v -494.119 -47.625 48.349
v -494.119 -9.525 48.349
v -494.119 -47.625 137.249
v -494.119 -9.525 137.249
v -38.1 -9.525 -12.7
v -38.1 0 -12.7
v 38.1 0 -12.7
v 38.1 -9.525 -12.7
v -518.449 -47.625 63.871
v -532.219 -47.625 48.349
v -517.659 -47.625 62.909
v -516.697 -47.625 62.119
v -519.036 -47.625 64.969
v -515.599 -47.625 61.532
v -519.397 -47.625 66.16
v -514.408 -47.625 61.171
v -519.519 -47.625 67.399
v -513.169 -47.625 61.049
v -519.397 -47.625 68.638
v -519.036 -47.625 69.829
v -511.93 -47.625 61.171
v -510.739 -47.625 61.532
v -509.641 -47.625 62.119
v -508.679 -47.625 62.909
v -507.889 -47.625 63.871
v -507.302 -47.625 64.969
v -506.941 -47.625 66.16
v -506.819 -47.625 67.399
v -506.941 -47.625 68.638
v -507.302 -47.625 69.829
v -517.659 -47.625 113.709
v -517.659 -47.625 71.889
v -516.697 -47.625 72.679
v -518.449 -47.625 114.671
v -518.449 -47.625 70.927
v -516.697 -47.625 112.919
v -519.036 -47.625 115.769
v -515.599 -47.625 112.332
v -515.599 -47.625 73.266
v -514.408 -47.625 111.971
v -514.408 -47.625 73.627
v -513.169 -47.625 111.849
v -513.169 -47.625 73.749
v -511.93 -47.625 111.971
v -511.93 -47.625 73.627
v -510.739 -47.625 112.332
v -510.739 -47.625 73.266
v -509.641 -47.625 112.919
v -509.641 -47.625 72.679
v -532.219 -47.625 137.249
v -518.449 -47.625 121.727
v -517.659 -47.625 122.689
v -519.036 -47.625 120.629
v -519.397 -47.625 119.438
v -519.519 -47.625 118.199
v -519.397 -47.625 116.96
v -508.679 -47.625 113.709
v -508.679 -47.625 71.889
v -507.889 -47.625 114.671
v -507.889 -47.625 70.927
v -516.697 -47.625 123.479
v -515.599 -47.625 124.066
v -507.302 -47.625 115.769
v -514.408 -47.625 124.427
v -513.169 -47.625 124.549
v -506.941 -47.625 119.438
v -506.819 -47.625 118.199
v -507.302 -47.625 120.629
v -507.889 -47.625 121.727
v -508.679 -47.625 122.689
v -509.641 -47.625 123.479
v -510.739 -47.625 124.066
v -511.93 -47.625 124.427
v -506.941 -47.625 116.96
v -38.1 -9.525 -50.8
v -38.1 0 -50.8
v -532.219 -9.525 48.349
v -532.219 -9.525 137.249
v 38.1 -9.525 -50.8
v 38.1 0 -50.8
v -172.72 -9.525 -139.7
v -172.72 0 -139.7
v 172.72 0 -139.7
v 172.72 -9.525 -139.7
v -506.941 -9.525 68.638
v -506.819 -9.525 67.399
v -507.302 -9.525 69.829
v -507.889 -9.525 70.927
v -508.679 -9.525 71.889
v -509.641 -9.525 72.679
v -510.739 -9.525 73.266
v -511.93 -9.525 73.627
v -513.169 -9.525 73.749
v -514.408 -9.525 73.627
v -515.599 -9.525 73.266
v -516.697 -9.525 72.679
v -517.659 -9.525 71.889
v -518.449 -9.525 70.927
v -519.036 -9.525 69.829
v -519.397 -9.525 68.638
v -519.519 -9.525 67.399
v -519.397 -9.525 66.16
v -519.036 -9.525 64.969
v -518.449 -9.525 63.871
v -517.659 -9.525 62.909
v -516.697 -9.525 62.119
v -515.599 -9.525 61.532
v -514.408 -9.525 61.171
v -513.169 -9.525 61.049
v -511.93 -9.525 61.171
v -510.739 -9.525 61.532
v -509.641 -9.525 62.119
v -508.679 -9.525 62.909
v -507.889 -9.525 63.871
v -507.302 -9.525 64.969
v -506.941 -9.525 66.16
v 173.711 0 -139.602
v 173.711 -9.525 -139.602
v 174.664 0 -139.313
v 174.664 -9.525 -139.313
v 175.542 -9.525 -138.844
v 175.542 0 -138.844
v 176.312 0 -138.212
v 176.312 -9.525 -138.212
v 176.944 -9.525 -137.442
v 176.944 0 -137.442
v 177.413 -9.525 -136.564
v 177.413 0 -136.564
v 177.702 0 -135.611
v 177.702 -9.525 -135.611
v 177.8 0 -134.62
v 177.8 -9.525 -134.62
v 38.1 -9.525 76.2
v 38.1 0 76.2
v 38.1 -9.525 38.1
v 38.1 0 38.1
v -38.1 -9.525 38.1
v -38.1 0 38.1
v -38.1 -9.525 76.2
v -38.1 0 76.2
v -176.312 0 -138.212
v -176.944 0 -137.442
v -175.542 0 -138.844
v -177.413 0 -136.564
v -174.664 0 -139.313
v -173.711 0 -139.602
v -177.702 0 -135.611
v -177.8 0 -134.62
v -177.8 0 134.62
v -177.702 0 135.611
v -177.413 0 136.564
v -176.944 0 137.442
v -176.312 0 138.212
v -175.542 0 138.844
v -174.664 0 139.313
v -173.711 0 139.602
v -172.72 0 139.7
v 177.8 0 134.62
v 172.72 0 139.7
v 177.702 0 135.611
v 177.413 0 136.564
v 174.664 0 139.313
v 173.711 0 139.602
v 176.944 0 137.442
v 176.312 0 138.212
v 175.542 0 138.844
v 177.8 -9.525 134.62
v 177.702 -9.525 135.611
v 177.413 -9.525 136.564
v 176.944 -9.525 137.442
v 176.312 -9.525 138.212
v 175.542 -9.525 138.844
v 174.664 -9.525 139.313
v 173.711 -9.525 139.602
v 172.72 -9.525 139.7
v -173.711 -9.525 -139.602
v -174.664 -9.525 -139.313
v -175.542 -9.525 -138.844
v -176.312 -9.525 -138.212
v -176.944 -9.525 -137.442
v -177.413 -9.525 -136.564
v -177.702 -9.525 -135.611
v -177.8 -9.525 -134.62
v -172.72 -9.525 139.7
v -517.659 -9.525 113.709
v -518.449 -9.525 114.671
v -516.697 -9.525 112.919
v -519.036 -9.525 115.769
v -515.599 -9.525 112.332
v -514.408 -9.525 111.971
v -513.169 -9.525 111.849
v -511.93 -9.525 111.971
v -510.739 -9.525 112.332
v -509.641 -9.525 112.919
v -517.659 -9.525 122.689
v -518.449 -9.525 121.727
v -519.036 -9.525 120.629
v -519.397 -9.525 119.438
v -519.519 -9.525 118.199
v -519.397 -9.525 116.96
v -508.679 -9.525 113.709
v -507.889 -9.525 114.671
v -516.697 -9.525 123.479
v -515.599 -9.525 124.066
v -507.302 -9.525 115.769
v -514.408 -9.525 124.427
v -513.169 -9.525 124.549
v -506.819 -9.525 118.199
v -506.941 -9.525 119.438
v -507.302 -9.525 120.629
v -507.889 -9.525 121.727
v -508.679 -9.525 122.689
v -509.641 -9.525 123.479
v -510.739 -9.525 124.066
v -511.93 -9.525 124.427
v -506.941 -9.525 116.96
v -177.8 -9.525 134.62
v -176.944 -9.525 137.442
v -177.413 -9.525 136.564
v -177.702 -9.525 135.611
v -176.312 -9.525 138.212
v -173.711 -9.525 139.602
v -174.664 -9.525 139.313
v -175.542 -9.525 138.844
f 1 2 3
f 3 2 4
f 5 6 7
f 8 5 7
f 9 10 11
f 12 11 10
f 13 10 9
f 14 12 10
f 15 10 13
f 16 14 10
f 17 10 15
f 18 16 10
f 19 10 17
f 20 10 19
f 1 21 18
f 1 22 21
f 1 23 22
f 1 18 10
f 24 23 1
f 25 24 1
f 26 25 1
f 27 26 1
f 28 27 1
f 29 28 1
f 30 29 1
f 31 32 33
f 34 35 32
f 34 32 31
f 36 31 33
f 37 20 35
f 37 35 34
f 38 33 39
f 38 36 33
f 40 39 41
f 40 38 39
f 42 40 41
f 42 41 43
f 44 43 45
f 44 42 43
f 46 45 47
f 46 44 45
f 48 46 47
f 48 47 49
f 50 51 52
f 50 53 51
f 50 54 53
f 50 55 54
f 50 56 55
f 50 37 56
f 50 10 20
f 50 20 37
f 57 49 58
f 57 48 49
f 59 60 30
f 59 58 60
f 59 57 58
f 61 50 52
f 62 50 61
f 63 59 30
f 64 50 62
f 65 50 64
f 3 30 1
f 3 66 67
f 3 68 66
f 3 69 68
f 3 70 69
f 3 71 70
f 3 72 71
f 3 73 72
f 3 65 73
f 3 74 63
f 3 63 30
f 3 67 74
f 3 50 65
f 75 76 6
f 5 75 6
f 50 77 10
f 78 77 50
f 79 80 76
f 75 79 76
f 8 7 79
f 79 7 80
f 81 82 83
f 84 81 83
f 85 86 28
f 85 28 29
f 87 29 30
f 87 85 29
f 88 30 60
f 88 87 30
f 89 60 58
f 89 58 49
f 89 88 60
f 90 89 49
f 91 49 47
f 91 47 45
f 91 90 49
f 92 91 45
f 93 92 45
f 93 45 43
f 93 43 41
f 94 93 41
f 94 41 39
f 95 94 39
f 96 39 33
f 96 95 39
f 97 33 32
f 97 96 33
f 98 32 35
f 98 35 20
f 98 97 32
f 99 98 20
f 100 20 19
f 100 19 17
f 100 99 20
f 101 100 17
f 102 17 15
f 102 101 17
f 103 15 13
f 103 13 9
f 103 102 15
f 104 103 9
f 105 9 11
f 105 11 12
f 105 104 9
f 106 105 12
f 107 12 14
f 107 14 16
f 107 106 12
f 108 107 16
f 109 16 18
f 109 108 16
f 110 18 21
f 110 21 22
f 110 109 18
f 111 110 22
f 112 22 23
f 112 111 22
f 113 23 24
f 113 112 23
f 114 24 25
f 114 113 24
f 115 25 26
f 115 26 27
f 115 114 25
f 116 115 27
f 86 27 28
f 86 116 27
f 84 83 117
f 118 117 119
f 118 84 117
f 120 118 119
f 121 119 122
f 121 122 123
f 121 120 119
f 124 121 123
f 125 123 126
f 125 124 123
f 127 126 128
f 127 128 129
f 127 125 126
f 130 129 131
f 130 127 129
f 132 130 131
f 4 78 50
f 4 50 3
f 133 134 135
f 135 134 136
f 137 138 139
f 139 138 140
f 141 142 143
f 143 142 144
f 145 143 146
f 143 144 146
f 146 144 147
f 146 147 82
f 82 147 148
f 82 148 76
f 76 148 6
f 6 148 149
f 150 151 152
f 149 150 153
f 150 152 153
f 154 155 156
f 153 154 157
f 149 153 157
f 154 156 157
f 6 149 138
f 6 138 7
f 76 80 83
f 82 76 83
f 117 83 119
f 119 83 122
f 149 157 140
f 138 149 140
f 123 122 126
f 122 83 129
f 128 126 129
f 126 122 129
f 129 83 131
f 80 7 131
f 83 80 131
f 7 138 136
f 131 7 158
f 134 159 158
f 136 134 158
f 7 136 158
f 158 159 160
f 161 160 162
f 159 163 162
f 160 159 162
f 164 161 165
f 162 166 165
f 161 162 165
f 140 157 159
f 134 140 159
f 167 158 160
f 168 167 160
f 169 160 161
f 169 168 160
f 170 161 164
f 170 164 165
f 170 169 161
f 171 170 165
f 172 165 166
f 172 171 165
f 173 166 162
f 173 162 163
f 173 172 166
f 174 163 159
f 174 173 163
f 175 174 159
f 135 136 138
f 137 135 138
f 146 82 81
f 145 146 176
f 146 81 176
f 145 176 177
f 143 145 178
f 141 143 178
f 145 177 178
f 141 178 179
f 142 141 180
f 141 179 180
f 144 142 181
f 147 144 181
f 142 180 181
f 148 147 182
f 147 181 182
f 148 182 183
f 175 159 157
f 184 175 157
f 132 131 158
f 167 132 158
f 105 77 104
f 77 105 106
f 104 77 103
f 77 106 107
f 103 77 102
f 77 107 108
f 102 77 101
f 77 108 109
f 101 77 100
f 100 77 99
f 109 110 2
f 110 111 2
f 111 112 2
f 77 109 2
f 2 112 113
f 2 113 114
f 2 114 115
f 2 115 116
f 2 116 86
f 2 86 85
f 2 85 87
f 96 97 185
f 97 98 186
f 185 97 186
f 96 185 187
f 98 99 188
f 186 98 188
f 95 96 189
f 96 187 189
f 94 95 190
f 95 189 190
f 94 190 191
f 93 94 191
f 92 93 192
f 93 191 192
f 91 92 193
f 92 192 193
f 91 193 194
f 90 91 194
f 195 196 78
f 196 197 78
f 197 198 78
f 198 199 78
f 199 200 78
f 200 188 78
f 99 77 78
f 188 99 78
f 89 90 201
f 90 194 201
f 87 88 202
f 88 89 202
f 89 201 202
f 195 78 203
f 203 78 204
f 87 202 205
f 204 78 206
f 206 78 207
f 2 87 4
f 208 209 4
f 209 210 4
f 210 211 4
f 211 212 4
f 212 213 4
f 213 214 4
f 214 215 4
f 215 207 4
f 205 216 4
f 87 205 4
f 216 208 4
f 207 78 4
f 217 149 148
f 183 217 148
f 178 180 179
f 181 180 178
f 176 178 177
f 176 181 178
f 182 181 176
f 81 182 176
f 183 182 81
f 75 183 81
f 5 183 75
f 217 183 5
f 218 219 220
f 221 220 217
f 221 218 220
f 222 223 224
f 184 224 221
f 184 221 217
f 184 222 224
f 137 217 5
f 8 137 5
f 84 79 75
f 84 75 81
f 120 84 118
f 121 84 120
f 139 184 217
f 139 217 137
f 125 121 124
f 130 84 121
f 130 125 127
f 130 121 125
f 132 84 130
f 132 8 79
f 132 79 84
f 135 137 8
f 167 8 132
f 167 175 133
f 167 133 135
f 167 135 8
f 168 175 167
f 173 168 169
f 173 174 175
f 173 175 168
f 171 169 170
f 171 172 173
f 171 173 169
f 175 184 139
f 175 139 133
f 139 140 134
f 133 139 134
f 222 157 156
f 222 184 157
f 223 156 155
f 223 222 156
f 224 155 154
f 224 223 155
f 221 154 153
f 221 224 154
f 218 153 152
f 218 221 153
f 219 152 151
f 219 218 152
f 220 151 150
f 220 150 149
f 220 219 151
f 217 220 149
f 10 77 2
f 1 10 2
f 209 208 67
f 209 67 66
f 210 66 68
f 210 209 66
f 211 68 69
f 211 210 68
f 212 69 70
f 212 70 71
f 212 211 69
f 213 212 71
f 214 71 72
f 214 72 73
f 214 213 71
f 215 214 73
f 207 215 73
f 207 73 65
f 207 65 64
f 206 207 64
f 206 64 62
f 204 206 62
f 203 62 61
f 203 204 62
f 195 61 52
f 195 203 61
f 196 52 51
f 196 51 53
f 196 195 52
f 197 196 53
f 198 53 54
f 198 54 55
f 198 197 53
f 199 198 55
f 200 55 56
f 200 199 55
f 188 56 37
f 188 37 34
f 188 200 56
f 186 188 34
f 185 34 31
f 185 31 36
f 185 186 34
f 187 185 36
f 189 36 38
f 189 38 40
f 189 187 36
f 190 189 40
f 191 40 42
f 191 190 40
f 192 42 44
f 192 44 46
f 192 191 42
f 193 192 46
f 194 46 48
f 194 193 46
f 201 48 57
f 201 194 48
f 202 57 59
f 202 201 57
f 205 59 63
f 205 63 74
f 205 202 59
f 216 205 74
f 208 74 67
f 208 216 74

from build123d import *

# Parameters (mm, degrees)
F1_DEPTH = 9.525
F2_R     = 5.08
F3_W     = 38.1
F3_H     = 88.9
F3_R     = 6.35
F4_DEPTH = 38.1


with BuildPart() as f1:
    # F0 (on Front) → F1 (new body)
    with BuildSketch(Plane.XZ):
        Polygon((-177.8, -139.7), (177.8, -139.7), (177.8, 139.7), (0, 139.7), (-177.8, 139.7), align=None)
        Polygon((-38.1, -12.7), (0, -12.7), (38.1, -12.7), (38.1, -50.8), (-38.1, -50.8), align=None, mode=Mode.SUBTRACT)
        Polygon((-38.1, 76.2), (0, 76.2), (38.1, 76.2), (38.1, 38.1), (0, 38.1), (-38.1, 38.1), align=None, mode=Mode.SUBTRACT)
    extrude(amount=F1_DEPTH)

    # F2
    f2_edges = [f1.edges().sort_by_distance(p)[0] for p in [
        (-177.8, -4.7625, 139.7),
        (177.8, -4.7625, 139.7),
        (177.8, -4.7625, -139.7),
        (-177.8, -4.7625, -139.7),
    ]]
    fillet(f2_edges, radius=F2_R)


with BuildPart() as f4:
    # F3 (on face) → F4 (new body)
    with BuildSketch(Plane.XZ.offset(9.525)):
        with Locations((-513.168887, 92.799038)):
            Rectangle(F3_W, F3_H)
        with Locations((-513.168887, 67.399038)):
            Circle(F3_R, mode=Mode.SUBTRACT)
        with Locations((-513.168887, 118.199038)):
            Circle(F3_R, mode=Mode.SUBTRACT)
    extrude(amount=F4_DEPTH)


solid = Compound([f1.part, f4.part])
